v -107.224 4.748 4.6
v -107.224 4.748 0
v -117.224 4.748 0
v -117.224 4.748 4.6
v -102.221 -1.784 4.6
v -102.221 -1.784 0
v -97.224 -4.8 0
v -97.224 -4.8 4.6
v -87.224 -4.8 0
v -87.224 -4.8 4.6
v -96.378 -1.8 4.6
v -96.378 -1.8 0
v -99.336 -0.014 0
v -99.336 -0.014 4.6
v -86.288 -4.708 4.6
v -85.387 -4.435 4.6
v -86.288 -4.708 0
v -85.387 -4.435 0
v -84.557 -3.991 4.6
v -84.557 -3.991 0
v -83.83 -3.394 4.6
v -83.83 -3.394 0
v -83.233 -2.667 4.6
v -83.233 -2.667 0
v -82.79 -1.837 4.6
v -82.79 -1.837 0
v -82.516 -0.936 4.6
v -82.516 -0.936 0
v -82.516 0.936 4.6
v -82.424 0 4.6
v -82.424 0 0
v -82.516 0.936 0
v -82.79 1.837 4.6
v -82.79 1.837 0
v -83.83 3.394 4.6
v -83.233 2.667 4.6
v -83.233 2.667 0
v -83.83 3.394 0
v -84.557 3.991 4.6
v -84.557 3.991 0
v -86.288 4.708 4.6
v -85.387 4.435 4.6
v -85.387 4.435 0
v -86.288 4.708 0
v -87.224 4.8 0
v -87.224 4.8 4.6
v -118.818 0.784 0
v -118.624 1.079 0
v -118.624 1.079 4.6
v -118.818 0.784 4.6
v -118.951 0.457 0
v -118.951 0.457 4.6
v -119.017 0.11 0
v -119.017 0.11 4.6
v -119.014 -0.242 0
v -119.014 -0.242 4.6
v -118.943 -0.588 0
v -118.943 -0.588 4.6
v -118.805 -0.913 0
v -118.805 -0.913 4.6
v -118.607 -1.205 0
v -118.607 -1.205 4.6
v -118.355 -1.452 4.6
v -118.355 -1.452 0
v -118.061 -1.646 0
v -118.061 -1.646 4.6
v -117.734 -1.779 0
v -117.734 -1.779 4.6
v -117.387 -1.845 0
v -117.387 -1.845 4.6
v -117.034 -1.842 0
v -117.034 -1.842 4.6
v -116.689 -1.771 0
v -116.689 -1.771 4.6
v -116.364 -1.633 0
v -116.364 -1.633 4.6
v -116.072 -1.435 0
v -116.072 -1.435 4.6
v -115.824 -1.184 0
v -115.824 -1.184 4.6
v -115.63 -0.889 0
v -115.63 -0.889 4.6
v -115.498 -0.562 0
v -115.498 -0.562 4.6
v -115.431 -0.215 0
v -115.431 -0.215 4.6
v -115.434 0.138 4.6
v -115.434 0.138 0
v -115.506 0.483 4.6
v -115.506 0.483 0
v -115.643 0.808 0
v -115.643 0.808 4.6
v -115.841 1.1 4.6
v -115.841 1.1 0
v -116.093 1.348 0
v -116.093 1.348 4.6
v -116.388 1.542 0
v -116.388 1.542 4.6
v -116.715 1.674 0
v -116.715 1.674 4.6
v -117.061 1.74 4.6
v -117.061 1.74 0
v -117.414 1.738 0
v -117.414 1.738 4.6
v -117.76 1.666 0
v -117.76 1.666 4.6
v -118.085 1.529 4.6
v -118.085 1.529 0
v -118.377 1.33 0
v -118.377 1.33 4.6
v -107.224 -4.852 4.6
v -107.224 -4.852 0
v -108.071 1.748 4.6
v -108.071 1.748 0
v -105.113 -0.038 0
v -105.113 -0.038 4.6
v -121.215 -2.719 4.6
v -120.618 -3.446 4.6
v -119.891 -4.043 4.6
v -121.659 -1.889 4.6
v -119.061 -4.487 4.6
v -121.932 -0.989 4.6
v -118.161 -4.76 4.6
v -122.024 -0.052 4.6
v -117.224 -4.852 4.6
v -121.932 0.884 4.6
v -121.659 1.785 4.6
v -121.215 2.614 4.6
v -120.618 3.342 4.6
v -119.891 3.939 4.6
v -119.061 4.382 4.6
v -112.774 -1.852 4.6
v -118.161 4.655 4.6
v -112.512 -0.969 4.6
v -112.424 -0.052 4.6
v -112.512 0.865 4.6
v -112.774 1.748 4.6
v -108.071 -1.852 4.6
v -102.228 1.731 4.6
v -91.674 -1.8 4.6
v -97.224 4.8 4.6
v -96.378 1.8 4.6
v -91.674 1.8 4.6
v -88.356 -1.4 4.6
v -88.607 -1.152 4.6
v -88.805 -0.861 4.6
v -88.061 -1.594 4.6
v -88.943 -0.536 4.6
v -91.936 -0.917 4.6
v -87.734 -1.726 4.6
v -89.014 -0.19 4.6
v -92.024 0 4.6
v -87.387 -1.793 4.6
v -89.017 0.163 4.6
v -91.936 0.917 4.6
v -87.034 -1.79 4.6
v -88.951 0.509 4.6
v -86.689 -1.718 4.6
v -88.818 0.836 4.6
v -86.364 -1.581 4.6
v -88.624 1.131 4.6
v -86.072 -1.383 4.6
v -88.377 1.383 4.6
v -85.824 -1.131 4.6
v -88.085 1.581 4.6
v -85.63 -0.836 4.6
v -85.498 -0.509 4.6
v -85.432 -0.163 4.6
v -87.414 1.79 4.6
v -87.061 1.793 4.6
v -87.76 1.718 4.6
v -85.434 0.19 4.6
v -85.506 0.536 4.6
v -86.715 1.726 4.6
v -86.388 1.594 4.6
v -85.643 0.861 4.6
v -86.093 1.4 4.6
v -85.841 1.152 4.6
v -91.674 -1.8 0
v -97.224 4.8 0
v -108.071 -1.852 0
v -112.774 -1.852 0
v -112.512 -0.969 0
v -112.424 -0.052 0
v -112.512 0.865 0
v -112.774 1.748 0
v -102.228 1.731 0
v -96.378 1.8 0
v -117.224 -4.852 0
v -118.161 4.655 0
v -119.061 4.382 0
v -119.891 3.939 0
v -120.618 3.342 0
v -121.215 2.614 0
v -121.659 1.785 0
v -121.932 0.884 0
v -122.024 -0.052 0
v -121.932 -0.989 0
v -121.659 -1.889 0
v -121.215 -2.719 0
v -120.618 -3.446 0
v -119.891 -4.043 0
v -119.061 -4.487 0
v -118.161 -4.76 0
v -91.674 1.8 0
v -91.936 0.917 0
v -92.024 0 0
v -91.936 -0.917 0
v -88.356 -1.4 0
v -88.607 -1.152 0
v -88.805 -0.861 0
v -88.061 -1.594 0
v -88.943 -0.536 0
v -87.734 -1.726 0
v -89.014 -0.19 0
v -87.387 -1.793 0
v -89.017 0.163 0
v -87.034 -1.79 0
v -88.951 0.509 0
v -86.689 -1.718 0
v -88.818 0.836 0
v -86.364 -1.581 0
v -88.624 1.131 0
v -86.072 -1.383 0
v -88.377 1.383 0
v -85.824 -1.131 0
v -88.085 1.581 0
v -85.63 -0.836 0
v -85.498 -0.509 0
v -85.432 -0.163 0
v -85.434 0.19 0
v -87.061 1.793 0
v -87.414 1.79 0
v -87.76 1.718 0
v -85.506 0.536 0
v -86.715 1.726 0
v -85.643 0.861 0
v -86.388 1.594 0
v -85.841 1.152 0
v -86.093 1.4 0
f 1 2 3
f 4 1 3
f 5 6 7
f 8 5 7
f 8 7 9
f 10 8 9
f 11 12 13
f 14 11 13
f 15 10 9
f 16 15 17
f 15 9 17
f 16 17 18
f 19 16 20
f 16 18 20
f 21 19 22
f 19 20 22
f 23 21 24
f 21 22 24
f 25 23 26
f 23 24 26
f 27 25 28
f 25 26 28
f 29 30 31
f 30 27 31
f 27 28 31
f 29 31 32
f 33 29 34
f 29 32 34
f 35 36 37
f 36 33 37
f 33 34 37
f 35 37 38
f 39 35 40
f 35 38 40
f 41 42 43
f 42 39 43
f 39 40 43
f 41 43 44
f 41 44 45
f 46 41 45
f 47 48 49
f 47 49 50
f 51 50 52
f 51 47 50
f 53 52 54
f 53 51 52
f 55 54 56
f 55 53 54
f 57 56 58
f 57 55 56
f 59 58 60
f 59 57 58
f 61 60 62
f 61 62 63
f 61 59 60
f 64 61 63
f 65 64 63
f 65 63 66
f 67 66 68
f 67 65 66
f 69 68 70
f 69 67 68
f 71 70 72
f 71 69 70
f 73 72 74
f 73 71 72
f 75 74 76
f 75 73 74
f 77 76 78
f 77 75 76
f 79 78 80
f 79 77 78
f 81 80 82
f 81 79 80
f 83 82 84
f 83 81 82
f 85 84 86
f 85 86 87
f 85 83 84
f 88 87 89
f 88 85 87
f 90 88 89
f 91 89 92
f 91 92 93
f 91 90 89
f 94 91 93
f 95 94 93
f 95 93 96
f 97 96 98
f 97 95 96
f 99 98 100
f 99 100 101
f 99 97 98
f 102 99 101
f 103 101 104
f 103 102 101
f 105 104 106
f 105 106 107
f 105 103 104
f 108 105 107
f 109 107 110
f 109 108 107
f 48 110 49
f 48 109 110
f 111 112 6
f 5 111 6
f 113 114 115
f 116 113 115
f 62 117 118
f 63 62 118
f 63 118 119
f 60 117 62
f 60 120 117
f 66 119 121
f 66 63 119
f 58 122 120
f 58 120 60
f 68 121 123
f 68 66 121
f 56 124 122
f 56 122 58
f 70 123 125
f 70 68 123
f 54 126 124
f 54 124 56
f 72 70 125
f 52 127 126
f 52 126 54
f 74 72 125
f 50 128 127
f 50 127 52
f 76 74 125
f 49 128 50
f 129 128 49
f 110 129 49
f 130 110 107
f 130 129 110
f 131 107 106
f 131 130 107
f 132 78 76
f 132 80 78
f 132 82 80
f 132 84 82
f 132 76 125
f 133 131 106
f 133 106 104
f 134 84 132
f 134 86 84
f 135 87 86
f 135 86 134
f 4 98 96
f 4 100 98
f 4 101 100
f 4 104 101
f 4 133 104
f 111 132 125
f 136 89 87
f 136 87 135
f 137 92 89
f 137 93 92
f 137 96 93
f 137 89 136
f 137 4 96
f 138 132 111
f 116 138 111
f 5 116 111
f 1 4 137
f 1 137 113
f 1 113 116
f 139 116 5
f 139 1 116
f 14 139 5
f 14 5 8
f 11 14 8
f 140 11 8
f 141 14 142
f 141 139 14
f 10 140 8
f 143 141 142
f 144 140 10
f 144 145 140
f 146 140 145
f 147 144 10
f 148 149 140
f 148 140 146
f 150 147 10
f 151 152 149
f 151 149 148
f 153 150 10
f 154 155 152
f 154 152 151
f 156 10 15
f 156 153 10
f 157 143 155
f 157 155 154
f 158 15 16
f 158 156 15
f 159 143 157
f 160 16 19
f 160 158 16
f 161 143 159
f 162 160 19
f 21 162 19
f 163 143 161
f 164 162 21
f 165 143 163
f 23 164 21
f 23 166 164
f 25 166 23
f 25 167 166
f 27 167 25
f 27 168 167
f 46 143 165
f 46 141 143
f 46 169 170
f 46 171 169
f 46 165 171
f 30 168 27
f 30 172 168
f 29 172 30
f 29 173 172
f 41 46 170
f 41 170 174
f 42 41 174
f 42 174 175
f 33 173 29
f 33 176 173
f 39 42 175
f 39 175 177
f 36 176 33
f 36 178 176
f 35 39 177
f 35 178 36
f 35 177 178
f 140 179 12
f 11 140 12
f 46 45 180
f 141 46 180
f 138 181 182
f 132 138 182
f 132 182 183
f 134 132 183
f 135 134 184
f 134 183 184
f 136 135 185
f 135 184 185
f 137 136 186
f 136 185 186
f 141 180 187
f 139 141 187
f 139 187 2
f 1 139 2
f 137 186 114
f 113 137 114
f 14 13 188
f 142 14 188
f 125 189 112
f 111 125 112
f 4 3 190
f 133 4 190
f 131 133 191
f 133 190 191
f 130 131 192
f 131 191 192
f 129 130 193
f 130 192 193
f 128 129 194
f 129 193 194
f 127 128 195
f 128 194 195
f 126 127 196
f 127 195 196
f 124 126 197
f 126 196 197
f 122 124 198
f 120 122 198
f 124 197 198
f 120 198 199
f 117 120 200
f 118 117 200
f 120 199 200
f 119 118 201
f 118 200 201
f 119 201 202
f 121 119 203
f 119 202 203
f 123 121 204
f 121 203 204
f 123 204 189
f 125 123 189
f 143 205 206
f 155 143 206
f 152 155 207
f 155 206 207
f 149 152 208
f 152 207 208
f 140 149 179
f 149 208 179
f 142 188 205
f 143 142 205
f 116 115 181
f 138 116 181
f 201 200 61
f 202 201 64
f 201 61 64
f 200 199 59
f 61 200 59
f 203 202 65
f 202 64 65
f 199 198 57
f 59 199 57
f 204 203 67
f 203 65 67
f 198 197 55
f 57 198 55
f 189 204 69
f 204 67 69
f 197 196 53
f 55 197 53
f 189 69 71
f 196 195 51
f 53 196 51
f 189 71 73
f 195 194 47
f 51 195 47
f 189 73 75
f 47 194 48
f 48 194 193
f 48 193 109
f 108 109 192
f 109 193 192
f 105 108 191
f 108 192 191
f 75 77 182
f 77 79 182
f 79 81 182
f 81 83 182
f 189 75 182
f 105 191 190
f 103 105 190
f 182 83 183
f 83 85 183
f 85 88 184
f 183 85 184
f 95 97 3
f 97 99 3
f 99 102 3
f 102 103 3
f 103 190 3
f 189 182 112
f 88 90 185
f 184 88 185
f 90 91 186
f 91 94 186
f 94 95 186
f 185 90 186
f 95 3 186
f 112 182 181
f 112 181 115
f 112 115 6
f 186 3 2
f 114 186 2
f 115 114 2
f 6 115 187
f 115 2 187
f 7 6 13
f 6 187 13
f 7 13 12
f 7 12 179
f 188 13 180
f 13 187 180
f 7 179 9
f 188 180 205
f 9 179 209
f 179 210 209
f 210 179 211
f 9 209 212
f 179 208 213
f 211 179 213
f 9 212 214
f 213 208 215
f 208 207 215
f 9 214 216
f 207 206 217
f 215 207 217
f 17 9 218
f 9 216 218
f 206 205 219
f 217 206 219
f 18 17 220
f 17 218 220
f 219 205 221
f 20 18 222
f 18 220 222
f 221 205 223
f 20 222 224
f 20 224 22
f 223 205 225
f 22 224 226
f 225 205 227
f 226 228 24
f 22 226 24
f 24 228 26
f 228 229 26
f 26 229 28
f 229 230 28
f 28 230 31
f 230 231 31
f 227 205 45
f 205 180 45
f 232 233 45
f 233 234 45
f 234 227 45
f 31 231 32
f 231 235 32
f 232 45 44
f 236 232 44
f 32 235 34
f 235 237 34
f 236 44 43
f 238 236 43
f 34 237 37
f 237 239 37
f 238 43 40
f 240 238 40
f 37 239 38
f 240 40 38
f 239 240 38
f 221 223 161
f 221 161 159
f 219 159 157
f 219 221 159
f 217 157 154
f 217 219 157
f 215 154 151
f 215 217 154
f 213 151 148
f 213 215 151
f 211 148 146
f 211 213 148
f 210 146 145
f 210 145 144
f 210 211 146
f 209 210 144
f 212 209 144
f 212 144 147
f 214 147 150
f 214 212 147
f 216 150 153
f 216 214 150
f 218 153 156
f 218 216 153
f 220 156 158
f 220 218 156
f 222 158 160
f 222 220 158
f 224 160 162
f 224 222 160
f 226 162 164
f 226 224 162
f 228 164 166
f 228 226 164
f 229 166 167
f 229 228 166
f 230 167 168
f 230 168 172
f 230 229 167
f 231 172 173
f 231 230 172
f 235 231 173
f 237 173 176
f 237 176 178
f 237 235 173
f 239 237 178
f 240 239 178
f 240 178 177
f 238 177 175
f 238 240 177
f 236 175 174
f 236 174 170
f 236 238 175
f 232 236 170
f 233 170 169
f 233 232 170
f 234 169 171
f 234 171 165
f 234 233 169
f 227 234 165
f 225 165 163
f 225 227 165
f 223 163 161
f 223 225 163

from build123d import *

# Parameters (mm, degrees)
SKETCH2_R           = 4.8
SKETCH2_R_2         = 1.8
BOSS_EXTRUDE1_DEPTH = 4.6


with BuildPart() as part:
    # Sketch2 → Boss-Extrude1 (new body)
    # profile 1 of 3: a face of its own
    with BuildSketch(Plane.XY):
        with Locations((-117.224103079, -0.052328238)):
            Circle(SKETCH2_R)
        with Locations(Location((-117.224103079, -0.052328238, 0), (0, 0, 141.059939776))):
            Circle(SKETCH2_R_2, mode=Mode.SUBTRACT)
    # profile 2 of 3: a face of its own
    with BuildSketch(Plane.XY):
        with BuildLine():
            ThreePointArc((-112.774383987, -1.852328238), (-114.540821506, -4.032277987), (-117.224103079, -4.852328238))
            Line((-117.224103079, -4.852328238), (-107.224087867, -4.852328238))
            Line((-107.224087867, -4.852328238), (-102.220792221, -1.783747748))
            Line((-102.220792221, -1.783747748), (-97.224209567, -4.8))
            Line((-97.224209567, -4.8), (-87.224194355, -4.8))
            ThreePointArc((-87.224194355, -4.8), (-89.907475928, -3.979949748), (-91.673913447, -1.8))
            Line((-91.673913447, -1.8), (-96.377520534, -1.8))
            Line((-96.377520534, -1.8), (-99.335675261, -0.014271338))
            Line((-99.335675261, -0.014271338), (-96.377520534, 1.8))
            Line((-96.377520534, 1.8), (-91.673913447, 1.8))
            ThreePointArc((-91.673913447, 1.8), (-89.907475928, 3.979949748), (-87.224194355, 4.8))
            Line((-87.224194355, 4.8), (-97.224209567, 4.8))
            Line((-97.224209567, 4.8), (-102.227505213, 1.731419509))
            Line((-102.227505213, 1.731419509), (-107.224087867, 4.747671762))
            Line((-107.224087867, 4.747671762), (-117.224103079, 4.747671762))
            ThreePointArc((-117.224103079, 4.747671762), (-114.540821506, 3.92762151), (-112.774383987, 1.747671762))
            Line((-112.774383987, 1.747671762), (-108.0707769, 1.747671762))
            Line((-108.0707769, 1.747671762), (-105.112622173, -0.0380569))
            Line((-105.112622173, -0.0380569), (-108.0707769, -1.852328238))
            Line((-108.0707769, -1.852328238), (-112.774383987, -1.852328238))
        make_face()
    # profile 3 of 3: a face of its own
    with BuildSketch(Plane.XY):
        with Locations((-87.224194355, 0)):
            Circle(SKETCH2_R)
        with Locations(Location((-87.224194355, 0, 0), (0, 0, 141.059939776))):
            Circle(SKETCH2_R_2, mode=Mode.SUBTRACT)
    extrude(amount=BOSS_EXTRUDE1_DEPTH)


solid = part.part
